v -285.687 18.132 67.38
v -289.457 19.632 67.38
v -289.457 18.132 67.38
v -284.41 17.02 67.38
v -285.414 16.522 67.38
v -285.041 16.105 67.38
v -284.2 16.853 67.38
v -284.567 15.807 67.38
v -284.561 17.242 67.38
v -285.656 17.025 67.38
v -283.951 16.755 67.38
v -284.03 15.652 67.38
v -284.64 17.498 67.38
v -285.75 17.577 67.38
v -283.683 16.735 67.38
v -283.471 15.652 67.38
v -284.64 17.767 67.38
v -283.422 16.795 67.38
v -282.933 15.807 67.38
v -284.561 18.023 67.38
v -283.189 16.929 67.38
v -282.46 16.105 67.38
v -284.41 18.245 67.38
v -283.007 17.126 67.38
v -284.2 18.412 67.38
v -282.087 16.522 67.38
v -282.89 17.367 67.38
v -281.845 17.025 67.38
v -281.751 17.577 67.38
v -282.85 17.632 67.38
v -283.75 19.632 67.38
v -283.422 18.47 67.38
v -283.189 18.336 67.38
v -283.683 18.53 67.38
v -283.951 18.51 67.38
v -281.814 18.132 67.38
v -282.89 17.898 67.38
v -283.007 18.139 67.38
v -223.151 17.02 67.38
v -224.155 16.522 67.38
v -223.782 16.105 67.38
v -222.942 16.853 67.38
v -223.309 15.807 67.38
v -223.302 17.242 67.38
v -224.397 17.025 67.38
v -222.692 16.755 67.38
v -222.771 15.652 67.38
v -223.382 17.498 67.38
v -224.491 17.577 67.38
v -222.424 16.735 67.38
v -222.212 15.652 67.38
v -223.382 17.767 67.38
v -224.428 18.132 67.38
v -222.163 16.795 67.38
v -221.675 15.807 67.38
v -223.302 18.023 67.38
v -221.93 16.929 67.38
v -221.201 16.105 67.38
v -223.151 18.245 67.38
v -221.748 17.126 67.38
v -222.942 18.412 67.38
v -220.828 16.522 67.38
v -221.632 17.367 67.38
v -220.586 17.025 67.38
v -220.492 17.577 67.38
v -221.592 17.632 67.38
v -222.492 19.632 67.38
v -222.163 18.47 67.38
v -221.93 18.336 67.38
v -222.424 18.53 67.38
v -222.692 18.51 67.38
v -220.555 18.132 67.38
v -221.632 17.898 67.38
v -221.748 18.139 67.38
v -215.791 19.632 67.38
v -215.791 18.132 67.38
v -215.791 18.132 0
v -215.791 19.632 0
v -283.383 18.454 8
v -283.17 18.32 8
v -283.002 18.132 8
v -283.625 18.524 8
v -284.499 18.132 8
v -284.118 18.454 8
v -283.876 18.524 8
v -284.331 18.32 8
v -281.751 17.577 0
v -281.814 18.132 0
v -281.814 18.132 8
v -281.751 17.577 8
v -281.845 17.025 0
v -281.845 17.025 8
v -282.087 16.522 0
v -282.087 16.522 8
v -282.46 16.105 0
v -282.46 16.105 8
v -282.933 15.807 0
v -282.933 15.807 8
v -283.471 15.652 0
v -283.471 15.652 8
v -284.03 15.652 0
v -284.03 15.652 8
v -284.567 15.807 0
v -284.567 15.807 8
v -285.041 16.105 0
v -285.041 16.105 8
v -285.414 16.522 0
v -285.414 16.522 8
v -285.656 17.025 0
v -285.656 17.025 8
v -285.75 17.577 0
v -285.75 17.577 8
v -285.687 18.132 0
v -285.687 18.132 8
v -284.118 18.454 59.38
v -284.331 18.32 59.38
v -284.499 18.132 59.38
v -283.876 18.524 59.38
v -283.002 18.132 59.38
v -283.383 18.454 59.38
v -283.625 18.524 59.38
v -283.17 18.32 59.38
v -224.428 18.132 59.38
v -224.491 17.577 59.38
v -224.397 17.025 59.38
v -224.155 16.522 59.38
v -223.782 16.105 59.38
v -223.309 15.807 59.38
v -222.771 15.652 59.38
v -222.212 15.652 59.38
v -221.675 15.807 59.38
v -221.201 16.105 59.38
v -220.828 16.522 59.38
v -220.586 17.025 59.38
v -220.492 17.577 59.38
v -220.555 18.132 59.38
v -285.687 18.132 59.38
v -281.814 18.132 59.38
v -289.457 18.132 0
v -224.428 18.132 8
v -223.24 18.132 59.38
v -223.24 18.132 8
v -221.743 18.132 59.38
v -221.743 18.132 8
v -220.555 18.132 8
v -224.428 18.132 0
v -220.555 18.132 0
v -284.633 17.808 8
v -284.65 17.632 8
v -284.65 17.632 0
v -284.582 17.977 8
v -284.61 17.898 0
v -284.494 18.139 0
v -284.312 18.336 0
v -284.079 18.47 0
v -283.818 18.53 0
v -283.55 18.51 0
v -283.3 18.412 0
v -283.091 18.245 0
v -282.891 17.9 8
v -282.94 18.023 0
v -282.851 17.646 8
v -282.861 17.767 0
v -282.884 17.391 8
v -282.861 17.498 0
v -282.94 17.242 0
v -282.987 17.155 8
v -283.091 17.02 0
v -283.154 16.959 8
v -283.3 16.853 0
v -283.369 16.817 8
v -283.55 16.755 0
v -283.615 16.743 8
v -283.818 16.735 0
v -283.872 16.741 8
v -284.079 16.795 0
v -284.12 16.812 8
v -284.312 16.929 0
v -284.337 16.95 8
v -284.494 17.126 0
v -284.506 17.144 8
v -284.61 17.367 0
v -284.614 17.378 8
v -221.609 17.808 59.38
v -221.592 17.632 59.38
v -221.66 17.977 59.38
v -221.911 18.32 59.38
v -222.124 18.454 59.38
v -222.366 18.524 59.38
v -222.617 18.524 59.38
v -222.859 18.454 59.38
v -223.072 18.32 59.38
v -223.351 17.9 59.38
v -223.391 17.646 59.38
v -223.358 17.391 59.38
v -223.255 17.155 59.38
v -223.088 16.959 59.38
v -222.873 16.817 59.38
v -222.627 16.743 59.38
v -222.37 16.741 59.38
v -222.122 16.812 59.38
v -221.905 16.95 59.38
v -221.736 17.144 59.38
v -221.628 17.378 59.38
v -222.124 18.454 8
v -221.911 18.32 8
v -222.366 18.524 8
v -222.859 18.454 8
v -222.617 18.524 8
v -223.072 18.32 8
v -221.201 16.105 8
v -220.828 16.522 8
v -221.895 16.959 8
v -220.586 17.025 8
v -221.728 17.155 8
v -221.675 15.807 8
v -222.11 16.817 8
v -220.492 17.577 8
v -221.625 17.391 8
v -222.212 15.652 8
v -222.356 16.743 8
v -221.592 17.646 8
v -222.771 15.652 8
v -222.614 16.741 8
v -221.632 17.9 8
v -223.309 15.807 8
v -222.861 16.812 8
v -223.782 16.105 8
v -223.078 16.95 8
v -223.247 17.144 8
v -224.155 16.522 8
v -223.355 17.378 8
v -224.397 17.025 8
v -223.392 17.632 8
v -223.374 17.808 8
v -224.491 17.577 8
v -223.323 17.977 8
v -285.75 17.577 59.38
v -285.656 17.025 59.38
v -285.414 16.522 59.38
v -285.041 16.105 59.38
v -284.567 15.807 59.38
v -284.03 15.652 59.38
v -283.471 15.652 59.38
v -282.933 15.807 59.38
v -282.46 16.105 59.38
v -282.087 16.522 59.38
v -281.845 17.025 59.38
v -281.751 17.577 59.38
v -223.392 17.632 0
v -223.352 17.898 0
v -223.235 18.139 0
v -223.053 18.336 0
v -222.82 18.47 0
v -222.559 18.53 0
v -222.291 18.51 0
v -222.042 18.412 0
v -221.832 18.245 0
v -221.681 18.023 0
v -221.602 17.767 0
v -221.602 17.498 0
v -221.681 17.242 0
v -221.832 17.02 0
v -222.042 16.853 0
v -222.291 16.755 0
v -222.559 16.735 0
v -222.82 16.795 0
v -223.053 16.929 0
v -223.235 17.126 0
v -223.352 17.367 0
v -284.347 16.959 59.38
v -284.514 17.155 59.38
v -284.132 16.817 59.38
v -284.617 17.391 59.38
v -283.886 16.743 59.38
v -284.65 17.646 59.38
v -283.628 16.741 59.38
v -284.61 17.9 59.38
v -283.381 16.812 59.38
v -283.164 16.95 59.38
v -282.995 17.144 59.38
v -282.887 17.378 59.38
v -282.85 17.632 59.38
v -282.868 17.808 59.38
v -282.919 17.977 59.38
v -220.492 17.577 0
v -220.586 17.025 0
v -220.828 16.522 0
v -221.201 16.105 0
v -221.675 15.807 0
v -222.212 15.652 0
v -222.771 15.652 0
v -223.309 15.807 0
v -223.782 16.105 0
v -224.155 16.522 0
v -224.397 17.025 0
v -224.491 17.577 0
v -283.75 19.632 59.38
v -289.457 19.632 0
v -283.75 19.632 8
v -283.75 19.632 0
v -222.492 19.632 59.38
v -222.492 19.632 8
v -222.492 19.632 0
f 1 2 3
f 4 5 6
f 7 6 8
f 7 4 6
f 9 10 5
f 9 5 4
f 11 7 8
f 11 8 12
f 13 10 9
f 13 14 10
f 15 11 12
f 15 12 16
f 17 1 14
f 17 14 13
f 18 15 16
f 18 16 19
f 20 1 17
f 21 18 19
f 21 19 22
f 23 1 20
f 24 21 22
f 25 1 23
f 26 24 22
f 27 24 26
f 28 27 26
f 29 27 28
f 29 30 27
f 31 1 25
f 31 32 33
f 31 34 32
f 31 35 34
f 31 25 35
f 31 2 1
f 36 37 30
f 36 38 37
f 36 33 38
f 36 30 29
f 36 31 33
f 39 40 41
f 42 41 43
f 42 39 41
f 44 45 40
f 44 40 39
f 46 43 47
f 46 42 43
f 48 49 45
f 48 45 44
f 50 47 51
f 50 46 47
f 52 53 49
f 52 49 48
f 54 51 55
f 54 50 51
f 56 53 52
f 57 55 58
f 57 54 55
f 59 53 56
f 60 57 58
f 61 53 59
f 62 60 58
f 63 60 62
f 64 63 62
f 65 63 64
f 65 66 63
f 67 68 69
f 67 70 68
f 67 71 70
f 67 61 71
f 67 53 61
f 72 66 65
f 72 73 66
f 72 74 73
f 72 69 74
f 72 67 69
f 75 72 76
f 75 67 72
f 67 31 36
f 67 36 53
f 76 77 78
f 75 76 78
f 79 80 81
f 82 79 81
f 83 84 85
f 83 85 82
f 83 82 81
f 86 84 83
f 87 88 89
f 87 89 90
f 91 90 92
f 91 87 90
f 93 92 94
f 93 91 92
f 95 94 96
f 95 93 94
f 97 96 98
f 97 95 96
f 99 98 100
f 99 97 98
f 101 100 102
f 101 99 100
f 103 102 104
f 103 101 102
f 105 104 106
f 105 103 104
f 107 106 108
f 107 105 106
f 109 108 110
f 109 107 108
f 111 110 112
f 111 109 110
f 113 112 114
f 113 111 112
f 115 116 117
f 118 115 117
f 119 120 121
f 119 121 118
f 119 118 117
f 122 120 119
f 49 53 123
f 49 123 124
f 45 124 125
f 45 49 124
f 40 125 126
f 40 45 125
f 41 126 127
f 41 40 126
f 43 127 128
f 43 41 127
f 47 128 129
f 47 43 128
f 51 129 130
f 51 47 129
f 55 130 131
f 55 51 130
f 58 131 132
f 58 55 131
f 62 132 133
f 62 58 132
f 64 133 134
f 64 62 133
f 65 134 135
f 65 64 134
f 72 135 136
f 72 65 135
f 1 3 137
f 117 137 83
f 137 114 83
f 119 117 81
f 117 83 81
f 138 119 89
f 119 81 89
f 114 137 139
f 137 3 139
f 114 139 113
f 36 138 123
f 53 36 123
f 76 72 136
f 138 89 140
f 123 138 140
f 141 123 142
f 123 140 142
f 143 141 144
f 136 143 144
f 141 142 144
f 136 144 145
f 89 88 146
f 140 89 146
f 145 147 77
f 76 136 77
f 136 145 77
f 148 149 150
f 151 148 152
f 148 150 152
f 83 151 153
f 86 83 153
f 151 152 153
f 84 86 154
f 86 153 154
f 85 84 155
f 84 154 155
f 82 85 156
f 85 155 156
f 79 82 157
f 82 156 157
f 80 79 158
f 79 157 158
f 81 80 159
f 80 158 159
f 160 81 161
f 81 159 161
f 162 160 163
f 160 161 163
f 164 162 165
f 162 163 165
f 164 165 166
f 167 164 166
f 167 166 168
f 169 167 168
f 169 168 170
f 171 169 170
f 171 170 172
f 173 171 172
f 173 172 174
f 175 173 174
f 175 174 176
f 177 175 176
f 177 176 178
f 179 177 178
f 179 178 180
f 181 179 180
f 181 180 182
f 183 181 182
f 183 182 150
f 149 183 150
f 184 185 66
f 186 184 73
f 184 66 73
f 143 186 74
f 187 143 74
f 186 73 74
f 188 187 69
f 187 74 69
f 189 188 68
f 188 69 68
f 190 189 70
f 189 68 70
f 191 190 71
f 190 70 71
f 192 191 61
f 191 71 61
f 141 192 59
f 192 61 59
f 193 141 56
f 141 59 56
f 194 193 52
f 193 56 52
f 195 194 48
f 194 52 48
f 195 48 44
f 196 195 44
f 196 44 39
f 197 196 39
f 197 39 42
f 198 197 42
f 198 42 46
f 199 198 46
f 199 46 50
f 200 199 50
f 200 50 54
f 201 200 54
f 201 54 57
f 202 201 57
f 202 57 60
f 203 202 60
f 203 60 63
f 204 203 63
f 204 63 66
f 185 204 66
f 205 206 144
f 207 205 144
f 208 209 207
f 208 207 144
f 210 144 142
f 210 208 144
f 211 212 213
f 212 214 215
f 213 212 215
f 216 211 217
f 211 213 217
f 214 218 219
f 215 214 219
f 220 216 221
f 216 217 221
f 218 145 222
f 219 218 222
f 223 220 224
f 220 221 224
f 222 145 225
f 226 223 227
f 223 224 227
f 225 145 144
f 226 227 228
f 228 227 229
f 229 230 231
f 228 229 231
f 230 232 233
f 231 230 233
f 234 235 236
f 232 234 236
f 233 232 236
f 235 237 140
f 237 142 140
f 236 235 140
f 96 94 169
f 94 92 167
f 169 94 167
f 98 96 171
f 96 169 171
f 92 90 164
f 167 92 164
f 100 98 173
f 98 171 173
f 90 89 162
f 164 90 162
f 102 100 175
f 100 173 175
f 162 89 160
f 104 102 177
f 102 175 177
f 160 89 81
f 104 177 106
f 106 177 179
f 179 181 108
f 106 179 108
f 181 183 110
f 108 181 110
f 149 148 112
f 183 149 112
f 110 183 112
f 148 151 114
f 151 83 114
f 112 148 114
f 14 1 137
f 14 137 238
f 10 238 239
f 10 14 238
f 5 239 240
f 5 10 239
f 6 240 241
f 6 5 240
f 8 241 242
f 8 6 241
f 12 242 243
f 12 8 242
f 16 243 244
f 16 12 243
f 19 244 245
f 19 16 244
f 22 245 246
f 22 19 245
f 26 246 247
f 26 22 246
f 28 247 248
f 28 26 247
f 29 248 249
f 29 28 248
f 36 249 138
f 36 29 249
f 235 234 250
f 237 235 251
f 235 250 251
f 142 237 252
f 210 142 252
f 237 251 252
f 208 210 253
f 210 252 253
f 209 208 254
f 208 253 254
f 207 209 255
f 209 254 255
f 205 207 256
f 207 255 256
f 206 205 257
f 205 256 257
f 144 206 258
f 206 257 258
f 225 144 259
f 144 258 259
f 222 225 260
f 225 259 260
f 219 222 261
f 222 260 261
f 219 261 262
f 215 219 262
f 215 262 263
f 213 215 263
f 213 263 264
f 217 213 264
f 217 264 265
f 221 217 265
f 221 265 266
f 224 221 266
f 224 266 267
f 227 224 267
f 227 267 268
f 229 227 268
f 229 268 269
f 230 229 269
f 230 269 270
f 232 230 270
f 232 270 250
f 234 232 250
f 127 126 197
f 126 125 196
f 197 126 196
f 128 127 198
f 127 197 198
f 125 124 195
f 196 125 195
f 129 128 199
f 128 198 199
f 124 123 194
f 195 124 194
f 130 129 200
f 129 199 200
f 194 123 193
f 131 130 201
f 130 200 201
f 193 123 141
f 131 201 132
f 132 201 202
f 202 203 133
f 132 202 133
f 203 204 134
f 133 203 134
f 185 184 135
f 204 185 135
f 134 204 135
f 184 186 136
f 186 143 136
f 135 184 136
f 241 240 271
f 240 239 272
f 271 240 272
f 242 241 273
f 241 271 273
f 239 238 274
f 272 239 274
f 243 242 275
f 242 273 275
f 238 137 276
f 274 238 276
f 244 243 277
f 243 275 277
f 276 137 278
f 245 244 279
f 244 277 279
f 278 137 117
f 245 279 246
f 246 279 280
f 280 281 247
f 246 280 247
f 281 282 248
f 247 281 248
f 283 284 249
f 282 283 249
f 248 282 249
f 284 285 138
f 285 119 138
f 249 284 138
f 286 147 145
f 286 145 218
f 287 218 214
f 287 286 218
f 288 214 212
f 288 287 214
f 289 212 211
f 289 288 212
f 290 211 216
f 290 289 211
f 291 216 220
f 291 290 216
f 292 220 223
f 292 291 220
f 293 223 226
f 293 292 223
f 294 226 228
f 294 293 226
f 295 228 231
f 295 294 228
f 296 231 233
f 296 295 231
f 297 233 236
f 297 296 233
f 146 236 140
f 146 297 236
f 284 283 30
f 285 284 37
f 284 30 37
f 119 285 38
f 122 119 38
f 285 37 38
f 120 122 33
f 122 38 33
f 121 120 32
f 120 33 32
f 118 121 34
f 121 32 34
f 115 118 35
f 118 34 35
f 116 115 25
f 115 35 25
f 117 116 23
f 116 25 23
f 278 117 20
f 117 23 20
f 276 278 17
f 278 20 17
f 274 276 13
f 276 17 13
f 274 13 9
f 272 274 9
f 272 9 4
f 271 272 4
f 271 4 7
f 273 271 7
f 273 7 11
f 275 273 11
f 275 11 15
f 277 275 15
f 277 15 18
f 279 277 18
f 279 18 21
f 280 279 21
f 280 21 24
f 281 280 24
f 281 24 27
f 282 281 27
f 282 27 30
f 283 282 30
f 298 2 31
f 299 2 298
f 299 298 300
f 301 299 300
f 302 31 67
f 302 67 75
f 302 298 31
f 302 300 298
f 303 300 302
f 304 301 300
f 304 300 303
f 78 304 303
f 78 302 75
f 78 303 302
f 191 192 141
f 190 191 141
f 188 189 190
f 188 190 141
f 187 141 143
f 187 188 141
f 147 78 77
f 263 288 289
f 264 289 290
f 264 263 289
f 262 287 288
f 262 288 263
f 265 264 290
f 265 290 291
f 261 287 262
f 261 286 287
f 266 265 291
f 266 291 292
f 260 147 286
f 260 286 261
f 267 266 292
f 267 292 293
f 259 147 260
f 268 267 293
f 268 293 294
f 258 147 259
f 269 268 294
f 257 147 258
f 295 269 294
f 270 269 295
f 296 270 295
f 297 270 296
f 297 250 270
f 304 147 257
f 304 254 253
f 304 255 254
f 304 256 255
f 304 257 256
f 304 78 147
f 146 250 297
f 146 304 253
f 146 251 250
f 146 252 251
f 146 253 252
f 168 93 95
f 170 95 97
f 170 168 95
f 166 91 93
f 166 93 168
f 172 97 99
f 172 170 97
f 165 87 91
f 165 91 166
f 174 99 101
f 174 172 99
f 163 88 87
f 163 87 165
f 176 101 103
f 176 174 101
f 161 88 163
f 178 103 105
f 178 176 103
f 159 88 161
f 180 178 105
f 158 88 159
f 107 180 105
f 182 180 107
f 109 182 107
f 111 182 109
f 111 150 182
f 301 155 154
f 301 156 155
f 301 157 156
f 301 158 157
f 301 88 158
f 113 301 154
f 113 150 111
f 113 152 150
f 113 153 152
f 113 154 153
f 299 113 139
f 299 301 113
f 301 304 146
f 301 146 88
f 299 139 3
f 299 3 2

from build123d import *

# Parameters (mm, degrees)
SKETCH1_W           = 73.66656521
SKETCH1_H           = 1.5
BOSS_EXTRUDE1_DEPTH = 67.38
SKETCH2_R           = 2
BOSS_EXTRUDE2_DEPTH = 8
SKETCH3_R           = 0.9
CUT_EXTRUDE1_DEPTH  = 8
SKETCH4_R           = 2
BOSS_EXTRUDE3_DEPTH = 8
SKETCH5_R           = 0.9
CUT_EXTRUDE2_DEPTH  = 8


with BuildPart() as part:
    # Sketch1 → Boss-Extrude1 (new body)
    with BuildSketch(Plane.XY):
        with Locations((-252.623812979, 18.882492425)):
            Rectangle(SKETCH1_W, SKETCH1_H)
    extrude(amount=BOSS_EXTRUDE1_DEPTH)

    # Sketch2 → Boss-Extrude2 (add)
    with BuildSketch(Plane(origin=(0, 0, 0), x_dir=(-1, 0, 0), z_dir=(0, 0, -1))):
        with Locations((283.750452743, 17.632492425)):
            Circle(SKETCH2_R)
        with Locations((222.491552839, 17.632492425)):
            Circle(SKETCH2_R)
    extrude(amount=-BOSS_EXTRUDE2_DEPTH)

    # Sketch3 → Cut-Extrude1 (cut)
    with BuildSketch(Plane(origin=(0, 0, 0), x_dir=(-1, 0, 0), z_dir=(0, 0, -1))):
        with Locations((222.491552839, 17.632492425)):
            Circle(SKETCH3_R)
        with Locations((283.750452743, 17.632492425)):
            Circle(SKETCH3_R)
    extrude(amount=-CUT_EXTRUDE1_DEPTH, mode=Mode.SUBTRACT)

    # Sketch4 → Boss-Extrude3 (add)
    with BuildSketch(Plane.XY.offset(67.38)):
        with Locations((-222.491552839, 17.632492425)):
            Circle(SKETCH4_R)
        with Locations((-283.750452743, 17.632492425)):
            Circle(SKETCH4_R)
    extrude(amount=-BOSS_EXTRUDE3_DEPTH)

    # Sketch5 → Cut-Extrude2 (cut)
    with BuildSketch(Plane.XY.offset(67.38)):
        with Locations((-283.750452743, 17.632492425)):
            Circle(SKETCH5_R)
        with Locations((-222.491552839, 17.632492425)):
            Circle(SKETCH5_R)
    extrude(amount=-CUT_EXTRUDE2_DEPTH, mode=Mode.SUBTRACT)


solid = part.part
